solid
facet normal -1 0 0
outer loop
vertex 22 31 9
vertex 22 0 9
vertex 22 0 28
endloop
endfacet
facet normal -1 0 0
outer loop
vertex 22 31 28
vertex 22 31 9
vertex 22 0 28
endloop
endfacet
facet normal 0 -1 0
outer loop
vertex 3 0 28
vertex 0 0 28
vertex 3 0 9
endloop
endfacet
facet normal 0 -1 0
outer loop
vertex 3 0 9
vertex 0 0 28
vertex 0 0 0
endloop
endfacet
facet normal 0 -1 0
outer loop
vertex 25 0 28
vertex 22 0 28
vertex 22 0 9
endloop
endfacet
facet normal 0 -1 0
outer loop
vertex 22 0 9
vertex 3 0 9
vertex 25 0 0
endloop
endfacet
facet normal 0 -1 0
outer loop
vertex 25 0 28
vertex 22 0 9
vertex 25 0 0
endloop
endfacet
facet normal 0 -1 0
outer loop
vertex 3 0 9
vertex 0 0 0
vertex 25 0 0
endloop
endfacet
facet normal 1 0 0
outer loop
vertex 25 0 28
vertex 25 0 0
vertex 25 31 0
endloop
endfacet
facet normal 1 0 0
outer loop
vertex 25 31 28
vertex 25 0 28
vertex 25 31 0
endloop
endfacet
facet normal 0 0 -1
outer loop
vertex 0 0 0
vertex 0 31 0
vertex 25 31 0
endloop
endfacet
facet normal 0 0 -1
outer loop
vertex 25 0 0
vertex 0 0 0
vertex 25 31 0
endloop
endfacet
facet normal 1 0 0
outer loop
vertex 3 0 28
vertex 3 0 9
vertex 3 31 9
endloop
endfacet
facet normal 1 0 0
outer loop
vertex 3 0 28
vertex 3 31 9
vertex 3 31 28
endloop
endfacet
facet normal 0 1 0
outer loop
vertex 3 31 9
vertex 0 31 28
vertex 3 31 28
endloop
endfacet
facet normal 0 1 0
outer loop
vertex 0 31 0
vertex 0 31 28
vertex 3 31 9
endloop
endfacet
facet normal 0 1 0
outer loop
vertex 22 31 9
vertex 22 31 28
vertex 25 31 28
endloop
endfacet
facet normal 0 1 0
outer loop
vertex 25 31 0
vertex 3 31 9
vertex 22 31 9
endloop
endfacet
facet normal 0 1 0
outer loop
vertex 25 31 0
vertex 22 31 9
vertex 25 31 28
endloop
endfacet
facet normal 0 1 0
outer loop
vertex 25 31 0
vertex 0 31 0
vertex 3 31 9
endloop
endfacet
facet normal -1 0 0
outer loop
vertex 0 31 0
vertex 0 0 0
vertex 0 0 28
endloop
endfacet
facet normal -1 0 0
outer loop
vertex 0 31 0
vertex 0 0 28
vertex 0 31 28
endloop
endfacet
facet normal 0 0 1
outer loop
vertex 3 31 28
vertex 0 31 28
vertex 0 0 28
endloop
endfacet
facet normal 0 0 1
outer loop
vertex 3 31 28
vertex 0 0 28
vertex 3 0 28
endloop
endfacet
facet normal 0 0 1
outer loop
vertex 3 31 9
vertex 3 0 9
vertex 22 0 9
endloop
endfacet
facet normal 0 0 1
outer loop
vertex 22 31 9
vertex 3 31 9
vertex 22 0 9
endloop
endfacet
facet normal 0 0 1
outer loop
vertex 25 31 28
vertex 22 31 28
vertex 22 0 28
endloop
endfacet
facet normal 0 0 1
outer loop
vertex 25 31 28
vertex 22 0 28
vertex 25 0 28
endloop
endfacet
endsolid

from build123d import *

# Parameters (mm, degrees)
F0_W     = 25
F0_H     = 31
F1_DEPTH = 28
F3_W     = 19
F3_H     = 19
F4_DEPTH = 31.001


with BuildPart() as f1:
    # F0 (on Top) → F1 (new body)
    with BuildSketch(Plane.XY):
        with Locations((12.5, 15.5)):
            Rectangle(F0_W, F0_H)
    extrude(amount=F1_DEPTH)

    # F3 (on face) → F4 (cut, through all)
    with BuildSketch(Plane.XZ):
        with Locations((12.500027, 18.500176)):
            Rectangle(F3_W, F3_H)
    extrude(amount=-F4_DEPTH, mode=Mode.SUBTRACT)


solid = f1.part
